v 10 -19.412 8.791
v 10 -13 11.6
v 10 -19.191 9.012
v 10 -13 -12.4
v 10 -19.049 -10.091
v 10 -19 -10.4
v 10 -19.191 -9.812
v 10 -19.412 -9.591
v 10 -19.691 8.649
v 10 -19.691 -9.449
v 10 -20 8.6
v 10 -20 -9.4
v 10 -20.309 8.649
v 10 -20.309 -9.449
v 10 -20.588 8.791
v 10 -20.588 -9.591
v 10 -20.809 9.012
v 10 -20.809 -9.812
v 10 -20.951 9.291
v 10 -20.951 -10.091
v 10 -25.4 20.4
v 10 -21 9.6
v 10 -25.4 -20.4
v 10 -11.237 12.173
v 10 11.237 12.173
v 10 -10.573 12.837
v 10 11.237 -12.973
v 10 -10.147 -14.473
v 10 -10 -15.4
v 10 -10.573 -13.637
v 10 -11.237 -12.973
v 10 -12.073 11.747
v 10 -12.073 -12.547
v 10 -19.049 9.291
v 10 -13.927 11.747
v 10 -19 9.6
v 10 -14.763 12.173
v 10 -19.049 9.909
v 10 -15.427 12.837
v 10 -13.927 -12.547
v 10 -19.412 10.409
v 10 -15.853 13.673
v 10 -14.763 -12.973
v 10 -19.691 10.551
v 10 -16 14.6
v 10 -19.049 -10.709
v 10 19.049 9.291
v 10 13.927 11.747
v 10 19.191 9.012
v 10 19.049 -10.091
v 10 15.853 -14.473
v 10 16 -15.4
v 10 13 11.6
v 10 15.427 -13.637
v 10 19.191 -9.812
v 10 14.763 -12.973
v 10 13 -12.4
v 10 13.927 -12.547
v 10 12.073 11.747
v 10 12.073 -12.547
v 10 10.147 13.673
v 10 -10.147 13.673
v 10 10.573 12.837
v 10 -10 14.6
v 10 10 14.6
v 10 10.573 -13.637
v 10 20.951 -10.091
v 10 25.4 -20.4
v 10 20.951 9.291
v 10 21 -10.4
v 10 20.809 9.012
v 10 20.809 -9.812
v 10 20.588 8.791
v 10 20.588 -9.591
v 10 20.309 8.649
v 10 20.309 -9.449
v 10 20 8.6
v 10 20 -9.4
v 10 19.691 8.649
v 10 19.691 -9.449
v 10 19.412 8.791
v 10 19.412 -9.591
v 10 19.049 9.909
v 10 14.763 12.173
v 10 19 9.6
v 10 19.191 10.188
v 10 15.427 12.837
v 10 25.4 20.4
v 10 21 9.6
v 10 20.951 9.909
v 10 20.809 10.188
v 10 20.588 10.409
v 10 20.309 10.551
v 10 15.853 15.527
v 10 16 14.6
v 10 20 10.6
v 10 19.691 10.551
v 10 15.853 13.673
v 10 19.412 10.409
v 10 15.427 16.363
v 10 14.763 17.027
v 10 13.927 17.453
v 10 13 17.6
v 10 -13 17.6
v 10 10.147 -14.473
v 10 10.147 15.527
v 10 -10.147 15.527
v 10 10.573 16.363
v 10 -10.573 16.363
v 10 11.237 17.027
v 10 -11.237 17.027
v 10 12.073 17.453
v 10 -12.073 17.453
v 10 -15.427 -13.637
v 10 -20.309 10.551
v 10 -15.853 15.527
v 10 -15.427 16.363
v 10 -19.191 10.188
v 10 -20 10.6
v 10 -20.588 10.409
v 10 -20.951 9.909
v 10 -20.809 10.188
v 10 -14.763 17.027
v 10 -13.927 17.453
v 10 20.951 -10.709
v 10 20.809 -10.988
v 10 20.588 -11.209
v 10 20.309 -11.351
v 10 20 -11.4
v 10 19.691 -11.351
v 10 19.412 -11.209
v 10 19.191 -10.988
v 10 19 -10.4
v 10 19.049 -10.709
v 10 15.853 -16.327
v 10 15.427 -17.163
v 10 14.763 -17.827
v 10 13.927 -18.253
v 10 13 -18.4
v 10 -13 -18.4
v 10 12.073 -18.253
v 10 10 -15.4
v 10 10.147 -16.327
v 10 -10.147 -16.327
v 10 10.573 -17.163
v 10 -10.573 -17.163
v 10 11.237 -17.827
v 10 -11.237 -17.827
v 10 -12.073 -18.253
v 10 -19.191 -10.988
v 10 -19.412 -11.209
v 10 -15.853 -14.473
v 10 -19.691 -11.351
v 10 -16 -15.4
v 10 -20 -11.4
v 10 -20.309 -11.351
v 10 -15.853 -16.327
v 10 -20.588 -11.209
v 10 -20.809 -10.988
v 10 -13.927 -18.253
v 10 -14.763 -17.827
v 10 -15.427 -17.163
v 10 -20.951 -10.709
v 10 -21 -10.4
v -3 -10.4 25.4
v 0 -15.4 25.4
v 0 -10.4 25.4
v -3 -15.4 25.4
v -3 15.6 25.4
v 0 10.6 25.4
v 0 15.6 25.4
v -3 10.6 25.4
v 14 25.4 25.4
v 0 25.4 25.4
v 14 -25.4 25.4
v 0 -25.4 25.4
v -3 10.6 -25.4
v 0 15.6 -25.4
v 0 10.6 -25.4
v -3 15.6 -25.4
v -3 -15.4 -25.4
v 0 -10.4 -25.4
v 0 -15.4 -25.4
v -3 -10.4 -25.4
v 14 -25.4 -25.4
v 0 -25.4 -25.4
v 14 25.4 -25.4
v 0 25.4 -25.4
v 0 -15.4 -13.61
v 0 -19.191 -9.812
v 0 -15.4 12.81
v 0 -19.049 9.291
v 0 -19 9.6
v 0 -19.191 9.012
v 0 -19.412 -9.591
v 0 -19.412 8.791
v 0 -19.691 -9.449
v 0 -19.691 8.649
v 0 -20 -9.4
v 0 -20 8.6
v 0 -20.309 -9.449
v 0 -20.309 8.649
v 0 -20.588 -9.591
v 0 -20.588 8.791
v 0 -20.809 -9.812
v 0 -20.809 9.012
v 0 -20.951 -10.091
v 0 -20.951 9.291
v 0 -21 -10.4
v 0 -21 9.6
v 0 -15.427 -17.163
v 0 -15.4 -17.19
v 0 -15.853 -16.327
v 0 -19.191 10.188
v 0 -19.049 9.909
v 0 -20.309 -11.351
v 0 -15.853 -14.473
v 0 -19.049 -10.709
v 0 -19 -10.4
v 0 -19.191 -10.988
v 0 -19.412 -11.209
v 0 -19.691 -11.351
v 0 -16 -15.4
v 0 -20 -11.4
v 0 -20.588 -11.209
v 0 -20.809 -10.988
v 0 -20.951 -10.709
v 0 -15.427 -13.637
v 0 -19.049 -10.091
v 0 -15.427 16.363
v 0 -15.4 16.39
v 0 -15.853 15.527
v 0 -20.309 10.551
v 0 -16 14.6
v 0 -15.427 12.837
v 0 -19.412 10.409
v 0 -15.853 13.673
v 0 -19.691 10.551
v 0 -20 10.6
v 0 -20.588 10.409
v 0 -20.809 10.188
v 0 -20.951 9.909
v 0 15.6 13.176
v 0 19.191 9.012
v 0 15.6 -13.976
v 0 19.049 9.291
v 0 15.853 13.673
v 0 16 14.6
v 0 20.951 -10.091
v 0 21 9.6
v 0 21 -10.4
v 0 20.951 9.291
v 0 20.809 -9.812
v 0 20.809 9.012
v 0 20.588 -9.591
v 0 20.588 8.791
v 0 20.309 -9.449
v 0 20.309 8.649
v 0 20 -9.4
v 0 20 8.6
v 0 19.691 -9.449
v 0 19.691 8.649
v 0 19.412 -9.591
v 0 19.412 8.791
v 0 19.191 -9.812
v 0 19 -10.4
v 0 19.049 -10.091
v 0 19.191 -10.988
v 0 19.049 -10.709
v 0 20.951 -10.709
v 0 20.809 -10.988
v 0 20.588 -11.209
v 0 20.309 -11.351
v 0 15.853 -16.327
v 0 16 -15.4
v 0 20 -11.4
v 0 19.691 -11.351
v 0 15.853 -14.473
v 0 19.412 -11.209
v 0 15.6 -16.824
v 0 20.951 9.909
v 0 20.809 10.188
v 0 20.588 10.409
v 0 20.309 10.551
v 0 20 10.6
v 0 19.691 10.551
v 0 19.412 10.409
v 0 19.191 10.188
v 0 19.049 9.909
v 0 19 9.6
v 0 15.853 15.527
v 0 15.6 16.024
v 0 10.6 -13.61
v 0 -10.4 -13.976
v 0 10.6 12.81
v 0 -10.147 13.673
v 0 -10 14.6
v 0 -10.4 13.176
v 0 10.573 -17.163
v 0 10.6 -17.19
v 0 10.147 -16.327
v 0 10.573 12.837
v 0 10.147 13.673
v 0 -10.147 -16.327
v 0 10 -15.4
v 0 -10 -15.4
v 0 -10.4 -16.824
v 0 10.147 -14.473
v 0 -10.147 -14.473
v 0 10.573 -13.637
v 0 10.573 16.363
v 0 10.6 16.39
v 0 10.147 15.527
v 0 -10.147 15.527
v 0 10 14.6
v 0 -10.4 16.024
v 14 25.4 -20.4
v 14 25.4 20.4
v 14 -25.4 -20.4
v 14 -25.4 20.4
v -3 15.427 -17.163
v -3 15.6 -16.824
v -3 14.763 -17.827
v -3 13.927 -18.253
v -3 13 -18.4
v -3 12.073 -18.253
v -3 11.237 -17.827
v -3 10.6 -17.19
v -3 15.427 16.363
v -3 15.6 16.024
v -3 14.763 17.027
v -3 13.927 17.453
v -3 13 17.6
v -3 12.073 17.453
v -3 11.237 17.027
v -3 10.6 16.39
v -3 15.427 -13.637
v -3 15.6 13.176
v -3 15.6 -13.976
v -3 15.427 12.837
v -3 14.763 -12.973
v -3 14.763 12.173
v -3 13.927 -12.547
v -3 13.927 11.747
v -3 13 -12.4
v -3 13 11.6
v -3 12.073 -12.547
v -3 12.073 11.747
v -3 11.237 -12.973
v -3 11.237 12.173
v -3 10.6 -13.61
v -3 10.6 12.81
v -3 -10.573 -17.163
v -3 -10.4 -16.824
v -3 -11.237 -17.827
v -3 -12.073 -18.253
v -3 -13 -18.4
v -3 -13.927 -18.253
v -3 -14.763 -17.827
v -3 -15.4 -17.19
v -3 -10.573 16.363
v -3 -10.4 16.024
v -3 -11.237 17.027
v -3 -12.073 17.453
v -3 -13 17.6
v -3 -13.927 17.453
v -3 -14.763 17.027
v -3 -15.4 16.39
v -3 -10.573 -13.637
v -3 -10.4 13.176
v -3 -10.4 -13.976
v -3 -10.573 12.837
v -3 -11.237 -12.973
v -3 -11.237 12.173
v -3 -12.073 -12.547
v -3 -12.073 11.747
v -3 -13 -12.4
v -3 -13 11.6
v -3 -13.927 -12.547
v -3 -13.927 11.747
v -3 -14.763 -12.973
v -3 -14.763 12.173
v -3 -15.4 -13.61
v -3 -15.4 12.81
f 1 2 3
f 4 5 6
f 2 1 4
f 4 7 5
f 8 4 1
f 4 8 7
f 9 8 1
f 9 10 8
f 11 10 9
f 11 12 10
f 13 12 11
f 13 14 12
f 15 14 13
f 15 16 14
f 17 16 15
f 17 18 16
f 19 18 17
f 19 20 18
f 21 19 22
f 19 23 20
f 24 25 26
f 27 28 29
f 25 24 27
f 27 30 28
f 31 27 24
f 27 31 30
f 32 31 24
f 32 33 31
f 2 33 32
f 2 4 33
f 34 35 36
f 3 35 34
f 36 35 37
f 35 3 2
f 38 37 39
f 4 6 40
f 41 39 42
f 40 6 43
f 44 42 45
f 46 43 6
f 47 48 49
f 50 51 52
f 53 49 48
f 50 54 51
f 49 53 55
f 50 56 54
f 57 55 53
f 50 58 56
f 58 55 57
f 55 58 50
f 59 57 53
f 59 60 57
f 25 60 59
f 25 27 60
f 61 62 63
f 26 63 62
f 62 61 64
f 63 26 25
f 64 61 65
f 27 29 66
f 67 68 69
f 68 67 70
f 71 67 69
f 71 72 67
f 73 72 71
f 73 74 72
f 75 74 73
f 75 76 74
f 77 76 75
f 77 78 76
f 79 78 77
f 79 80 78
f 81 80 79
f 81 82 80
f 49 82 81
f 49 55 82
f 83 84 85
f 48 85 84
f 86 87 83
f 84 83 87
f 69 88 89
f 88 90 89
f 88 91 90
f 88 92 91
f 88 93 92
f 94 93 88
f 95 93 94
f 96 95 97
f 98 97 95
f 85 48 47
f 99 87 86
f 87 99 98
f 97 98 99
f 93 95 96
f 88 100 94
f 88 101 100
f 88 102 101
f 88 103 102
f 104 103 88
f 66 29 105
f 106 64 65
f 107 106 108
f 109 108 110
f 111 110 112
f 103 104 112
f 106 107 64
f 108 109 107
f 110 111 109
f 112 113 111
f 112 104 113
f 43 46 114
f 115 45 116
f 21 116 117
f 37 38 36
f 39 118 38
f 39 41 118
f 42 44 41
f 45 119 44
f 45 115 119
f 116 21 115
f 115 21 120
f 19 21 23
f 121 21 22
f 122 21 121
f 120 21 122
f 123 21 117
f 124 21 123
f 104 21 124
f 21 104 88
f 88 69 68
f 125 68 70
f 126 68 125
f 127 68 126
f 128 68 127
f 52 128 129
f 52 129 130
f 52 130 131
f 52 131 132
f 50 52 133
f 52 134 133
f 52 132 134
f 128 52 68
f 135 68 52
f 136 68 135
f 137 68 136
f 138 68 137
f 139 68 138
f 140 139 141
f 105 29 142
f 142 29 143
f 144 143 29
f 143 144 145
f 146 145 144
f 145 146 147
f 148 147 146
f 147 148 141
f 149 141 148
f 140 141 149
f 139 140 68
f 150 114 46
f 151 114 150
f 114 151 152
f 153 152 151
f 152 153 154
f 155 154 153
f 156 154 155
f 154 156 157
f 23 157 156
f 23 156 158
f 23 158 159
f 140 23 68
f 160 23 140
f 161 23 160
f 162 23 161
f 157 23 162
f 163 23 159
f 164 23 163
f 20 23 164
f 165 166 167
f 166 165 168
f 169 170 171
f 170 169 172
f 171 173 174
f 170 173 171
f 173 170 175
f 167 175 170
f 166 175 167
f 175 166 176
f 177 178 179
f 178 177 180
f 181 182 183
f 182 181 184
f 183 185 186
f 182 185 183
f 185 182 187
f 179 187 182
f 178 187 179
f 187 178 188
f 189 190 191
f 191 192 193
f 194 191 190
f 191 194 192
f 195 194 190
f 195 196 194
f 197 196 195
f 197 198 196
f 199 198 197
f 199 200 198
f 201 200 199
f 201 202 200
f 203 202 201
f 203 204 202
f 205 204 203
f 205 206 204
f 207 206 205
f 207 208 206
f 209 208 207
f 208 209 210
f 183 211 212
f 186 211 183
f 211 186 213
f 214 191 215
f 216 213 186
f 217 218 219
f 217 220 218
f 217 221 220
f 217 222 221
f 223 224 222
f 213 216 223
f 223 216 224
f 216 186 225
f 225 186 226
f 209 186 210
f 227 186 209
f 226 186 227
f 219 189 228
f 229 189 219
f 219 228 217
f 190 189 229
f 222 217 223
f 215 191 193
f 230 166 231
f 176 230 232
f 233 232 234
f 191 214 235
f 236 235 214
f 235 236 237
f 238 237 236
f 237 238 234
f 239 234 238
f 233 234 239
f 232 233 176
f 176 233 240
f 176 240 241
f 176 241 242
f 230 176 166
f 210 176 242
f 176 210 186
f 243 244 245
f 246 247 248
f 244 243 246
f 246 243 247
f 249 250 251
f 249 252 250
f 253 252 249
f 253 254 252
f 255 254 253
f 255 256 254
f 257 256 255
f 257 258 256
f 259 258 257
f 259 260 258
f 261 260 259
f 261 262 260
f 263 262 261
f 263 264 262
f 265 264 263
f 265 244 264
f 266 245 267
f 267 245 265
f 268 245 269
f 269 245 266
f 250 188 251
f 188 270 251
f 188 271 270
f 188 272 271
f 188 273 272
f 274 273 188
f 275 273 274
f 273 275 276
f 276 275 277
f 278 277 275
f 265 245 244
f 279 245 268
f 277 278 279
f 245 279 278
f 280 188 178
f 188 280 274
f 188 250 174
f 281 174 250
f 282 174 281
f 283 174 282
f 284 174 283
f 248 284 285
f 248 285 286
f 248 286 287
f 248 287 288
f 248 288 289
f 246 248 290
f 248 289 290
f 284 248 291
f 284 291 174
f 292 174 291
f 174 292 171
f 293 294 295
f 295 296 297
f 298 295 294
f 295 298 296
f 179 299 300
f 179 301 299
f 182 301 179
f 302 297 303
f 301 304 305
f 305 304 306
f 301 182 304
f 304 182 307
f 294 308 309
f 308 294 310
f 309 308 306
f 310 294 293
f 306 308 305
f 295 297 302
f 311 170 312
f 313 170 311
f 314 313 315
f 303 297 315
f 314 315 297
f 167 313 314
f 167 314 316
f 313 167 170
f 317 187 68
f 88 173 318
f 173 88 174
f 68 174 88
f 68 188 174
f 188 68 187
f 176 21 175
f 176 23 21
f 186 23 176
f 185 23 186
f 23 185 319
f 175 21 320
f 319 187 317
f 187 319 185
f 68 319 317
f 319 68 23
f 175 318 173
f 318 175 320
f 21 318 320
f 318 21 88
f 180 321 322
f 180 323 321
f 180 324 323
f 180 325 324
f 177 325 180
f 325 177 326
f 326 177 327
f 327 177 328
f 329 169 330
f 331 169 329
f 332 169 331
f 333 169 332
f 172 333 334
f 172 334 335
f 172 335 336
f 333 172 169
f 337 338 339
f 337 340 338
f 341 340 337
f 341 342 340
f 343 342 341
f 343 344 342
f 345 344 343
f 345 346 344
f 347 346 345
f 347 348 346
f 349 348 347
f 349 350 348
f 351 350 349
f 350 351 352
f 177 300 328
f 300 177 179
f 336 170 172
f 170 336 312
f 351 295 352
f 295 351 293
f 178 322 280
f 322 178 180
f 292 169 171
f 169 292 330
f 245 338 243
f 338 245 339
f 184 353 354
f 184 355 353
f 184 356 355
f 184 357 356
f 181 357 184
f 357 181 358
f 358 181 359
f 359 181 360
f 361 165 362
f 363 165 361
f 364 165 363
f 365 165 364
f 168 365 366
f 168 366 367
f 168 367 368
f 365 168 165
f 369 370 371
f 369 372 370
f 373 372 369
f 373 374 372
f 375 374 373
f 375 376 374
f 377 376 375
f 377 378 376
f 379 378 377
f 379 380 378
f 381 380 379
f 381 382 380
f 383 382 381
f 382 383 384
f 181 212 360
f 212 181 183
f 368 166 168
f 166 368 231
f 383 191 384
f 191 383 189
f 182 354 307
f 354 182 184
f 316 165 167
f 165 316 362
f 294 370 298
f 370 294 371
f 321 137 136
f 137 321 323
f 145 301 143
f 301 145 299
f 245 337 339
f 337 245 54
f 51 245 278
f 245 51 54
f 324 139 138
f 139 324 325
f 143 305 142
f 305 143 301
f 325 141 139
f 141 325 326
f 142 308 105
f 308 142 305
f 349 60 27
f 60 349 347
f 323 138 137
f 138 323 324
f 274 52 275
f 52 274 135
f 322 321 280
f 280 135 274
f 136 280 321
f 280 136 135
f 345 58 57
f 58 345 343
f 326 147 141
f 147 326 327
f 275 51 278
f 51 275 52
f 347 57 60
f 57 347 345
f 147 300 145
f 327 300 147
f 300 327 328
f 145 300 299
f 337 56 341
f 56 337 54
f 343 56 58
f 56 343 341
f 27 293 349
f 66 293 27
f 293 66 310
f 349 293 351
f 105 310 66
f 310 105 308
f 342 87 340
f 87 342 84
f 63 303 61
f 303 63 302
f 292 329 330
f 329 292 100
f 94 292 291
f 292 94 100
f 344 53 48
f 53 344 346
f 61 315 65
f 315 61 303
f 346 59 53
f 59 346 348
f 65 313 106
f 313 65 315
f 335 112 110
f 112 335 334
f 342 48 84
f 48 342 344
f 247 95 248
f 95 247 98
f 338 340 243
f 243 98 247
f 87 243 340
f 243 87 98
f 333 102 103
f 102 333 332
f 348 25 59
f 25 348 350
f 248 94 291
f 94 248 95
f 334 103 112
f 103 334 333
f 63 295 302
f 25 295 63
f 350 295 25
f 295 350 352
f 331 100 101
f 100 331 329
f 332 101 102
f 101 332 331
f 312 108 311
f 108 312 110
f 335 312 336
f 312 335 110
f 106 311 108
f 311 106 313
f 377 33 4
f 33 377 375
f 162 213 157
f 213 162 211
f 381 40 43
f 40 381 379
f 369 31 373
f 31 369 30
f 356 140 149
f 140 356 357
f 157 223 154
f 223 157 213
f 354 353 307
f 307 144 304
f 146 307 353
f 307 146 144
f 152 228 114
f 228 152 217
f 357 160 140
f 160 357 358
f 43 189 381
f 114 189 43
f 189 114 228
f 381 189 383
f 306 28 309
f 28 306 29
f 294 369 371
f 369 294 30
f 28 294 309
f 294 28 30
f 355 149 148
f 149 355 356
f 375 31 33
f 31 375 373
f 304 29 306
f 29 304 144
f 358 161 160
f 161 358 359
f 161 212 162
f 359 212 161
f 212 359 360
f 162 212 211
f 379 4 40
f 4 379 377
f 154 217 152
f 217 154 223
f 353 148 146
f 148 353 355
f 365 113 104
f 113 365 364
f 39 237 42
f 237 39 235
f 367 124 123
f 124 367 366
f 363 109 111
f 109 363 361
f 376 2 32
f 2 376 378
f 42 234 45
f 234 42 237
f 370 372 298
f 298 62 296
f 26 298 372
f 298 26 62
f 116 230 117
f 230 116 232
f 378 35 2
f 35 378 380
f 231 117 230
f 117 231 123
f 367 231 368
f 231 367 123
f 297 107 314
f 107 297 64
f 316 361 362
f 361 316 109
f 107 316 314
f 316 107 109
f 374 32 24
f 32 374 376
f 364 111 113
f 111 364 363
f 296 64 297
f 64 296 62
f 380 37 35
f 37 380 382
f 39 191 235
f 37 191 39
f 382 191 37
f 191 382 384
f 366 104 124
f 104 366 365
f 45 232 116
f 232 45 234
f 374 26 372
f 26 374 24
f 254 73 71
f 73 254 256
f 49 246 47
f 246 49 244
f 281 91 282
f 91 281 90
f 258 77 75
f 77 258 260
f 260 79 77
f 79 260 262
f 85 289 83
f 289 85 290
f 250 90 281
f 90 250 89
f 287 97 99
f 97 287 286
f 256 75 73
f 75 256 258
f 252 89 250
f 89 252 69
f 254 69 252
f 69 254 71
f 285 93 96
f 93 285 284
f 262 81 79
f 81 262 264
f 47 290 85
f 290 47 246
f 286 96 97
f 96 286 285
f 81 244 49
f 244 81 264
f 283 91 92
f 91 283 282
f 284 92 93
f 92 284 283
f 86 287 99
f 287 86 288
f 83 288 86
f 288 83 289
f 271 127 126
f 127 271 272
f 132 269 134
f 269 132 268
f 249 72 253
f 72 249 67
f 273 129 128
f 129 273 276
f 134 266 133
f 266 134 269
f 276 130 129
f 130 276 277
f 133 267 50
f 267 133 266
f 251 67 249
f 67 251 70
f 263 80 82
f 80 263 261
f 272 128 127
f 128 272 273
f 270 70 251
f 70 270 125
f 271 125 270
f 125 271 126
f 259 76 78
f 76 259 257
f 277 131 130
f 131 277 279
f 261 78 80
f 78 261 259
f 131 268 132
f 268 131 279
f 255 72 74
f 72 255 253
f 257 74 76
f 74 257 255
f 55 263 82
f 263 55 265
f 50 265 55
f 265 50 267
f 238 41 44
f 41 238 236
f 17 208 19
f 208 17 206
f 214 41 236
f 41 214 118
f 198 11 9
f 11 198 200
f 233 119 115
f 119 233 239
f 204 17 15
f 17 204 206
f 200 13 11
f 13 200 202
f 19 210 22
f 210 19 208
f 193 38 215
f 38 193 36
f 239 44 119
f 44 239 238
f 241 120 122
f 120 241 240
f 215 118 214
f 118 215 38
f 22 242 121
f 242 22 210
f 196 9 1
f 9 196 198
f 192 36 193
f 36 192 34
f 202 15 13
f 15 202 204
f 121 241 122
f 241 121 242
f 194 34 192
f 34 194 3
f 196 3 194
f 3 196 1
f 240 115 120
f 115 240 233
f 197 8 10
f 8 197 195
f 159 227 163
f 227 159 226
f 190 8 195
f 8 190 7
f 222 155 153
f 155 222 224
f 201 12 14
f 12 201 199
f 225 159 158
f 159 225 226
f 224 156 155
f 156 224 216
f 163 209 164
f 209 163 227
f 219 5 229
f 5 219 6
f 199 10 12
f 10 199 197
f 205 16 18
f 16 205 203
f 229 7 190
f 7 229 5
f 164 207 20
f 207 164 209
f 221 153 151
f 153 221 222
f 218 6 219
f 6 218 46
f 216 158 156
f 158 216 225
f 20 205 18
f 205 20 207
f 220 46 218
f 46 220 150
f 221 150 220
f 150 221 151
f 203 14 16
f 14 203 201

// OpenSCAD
//Bracket

module 8020toKR33bracket(size=2*25.4, spacer=14) {
    $fn=20;
    translate([0,0,-25.4])
    difference() {
        translate([0, -size/2, 0]) 
        union() {
            cube([10, size, size]);
            cube([spacer, size, 5]);
            translate([0, 0, size-5]) cube([14, size, 5]);
            rotate([0,270,0]) translate([0, 36, 0]) cube([size, 5, 3]);
            rotate([0,270,0]) translate([0, 10, 0]) cube([size, 5, 3]);
        }
        
        union() { 
            //Big holes
    
            translate([-10, 13, 10]) rotate([0, 90,0]) cylinder(30, d=6);
            translate([-10, 13, 40]) rotate([0, 90,0]) cylinder(30, d=6);
            translate([-10, -13, 10]) rotate([0, 90,0]) cylinder(30, d=6);
            translate([-10, -13, 40]) rotate([0, 90,0]) cylinder(30, d=6);
            //Small holes
            translate([-10, 20, 35]) rotate([0, 90,0]) cylinder(30, d=2);
            translate([-10, 20, 15]) rotate([0, 90,0]) cylinder(30, d=2);
            translate([-10, -20, 35]) rotate([0, 90,0]) cylinder(30, d=2);
            translate([-10, -20, 15]) rotate([0, 90,0]) cylinder(30, d=2);
        }
    }
}

8020toKR33bracket();

//TODO - fix backside
